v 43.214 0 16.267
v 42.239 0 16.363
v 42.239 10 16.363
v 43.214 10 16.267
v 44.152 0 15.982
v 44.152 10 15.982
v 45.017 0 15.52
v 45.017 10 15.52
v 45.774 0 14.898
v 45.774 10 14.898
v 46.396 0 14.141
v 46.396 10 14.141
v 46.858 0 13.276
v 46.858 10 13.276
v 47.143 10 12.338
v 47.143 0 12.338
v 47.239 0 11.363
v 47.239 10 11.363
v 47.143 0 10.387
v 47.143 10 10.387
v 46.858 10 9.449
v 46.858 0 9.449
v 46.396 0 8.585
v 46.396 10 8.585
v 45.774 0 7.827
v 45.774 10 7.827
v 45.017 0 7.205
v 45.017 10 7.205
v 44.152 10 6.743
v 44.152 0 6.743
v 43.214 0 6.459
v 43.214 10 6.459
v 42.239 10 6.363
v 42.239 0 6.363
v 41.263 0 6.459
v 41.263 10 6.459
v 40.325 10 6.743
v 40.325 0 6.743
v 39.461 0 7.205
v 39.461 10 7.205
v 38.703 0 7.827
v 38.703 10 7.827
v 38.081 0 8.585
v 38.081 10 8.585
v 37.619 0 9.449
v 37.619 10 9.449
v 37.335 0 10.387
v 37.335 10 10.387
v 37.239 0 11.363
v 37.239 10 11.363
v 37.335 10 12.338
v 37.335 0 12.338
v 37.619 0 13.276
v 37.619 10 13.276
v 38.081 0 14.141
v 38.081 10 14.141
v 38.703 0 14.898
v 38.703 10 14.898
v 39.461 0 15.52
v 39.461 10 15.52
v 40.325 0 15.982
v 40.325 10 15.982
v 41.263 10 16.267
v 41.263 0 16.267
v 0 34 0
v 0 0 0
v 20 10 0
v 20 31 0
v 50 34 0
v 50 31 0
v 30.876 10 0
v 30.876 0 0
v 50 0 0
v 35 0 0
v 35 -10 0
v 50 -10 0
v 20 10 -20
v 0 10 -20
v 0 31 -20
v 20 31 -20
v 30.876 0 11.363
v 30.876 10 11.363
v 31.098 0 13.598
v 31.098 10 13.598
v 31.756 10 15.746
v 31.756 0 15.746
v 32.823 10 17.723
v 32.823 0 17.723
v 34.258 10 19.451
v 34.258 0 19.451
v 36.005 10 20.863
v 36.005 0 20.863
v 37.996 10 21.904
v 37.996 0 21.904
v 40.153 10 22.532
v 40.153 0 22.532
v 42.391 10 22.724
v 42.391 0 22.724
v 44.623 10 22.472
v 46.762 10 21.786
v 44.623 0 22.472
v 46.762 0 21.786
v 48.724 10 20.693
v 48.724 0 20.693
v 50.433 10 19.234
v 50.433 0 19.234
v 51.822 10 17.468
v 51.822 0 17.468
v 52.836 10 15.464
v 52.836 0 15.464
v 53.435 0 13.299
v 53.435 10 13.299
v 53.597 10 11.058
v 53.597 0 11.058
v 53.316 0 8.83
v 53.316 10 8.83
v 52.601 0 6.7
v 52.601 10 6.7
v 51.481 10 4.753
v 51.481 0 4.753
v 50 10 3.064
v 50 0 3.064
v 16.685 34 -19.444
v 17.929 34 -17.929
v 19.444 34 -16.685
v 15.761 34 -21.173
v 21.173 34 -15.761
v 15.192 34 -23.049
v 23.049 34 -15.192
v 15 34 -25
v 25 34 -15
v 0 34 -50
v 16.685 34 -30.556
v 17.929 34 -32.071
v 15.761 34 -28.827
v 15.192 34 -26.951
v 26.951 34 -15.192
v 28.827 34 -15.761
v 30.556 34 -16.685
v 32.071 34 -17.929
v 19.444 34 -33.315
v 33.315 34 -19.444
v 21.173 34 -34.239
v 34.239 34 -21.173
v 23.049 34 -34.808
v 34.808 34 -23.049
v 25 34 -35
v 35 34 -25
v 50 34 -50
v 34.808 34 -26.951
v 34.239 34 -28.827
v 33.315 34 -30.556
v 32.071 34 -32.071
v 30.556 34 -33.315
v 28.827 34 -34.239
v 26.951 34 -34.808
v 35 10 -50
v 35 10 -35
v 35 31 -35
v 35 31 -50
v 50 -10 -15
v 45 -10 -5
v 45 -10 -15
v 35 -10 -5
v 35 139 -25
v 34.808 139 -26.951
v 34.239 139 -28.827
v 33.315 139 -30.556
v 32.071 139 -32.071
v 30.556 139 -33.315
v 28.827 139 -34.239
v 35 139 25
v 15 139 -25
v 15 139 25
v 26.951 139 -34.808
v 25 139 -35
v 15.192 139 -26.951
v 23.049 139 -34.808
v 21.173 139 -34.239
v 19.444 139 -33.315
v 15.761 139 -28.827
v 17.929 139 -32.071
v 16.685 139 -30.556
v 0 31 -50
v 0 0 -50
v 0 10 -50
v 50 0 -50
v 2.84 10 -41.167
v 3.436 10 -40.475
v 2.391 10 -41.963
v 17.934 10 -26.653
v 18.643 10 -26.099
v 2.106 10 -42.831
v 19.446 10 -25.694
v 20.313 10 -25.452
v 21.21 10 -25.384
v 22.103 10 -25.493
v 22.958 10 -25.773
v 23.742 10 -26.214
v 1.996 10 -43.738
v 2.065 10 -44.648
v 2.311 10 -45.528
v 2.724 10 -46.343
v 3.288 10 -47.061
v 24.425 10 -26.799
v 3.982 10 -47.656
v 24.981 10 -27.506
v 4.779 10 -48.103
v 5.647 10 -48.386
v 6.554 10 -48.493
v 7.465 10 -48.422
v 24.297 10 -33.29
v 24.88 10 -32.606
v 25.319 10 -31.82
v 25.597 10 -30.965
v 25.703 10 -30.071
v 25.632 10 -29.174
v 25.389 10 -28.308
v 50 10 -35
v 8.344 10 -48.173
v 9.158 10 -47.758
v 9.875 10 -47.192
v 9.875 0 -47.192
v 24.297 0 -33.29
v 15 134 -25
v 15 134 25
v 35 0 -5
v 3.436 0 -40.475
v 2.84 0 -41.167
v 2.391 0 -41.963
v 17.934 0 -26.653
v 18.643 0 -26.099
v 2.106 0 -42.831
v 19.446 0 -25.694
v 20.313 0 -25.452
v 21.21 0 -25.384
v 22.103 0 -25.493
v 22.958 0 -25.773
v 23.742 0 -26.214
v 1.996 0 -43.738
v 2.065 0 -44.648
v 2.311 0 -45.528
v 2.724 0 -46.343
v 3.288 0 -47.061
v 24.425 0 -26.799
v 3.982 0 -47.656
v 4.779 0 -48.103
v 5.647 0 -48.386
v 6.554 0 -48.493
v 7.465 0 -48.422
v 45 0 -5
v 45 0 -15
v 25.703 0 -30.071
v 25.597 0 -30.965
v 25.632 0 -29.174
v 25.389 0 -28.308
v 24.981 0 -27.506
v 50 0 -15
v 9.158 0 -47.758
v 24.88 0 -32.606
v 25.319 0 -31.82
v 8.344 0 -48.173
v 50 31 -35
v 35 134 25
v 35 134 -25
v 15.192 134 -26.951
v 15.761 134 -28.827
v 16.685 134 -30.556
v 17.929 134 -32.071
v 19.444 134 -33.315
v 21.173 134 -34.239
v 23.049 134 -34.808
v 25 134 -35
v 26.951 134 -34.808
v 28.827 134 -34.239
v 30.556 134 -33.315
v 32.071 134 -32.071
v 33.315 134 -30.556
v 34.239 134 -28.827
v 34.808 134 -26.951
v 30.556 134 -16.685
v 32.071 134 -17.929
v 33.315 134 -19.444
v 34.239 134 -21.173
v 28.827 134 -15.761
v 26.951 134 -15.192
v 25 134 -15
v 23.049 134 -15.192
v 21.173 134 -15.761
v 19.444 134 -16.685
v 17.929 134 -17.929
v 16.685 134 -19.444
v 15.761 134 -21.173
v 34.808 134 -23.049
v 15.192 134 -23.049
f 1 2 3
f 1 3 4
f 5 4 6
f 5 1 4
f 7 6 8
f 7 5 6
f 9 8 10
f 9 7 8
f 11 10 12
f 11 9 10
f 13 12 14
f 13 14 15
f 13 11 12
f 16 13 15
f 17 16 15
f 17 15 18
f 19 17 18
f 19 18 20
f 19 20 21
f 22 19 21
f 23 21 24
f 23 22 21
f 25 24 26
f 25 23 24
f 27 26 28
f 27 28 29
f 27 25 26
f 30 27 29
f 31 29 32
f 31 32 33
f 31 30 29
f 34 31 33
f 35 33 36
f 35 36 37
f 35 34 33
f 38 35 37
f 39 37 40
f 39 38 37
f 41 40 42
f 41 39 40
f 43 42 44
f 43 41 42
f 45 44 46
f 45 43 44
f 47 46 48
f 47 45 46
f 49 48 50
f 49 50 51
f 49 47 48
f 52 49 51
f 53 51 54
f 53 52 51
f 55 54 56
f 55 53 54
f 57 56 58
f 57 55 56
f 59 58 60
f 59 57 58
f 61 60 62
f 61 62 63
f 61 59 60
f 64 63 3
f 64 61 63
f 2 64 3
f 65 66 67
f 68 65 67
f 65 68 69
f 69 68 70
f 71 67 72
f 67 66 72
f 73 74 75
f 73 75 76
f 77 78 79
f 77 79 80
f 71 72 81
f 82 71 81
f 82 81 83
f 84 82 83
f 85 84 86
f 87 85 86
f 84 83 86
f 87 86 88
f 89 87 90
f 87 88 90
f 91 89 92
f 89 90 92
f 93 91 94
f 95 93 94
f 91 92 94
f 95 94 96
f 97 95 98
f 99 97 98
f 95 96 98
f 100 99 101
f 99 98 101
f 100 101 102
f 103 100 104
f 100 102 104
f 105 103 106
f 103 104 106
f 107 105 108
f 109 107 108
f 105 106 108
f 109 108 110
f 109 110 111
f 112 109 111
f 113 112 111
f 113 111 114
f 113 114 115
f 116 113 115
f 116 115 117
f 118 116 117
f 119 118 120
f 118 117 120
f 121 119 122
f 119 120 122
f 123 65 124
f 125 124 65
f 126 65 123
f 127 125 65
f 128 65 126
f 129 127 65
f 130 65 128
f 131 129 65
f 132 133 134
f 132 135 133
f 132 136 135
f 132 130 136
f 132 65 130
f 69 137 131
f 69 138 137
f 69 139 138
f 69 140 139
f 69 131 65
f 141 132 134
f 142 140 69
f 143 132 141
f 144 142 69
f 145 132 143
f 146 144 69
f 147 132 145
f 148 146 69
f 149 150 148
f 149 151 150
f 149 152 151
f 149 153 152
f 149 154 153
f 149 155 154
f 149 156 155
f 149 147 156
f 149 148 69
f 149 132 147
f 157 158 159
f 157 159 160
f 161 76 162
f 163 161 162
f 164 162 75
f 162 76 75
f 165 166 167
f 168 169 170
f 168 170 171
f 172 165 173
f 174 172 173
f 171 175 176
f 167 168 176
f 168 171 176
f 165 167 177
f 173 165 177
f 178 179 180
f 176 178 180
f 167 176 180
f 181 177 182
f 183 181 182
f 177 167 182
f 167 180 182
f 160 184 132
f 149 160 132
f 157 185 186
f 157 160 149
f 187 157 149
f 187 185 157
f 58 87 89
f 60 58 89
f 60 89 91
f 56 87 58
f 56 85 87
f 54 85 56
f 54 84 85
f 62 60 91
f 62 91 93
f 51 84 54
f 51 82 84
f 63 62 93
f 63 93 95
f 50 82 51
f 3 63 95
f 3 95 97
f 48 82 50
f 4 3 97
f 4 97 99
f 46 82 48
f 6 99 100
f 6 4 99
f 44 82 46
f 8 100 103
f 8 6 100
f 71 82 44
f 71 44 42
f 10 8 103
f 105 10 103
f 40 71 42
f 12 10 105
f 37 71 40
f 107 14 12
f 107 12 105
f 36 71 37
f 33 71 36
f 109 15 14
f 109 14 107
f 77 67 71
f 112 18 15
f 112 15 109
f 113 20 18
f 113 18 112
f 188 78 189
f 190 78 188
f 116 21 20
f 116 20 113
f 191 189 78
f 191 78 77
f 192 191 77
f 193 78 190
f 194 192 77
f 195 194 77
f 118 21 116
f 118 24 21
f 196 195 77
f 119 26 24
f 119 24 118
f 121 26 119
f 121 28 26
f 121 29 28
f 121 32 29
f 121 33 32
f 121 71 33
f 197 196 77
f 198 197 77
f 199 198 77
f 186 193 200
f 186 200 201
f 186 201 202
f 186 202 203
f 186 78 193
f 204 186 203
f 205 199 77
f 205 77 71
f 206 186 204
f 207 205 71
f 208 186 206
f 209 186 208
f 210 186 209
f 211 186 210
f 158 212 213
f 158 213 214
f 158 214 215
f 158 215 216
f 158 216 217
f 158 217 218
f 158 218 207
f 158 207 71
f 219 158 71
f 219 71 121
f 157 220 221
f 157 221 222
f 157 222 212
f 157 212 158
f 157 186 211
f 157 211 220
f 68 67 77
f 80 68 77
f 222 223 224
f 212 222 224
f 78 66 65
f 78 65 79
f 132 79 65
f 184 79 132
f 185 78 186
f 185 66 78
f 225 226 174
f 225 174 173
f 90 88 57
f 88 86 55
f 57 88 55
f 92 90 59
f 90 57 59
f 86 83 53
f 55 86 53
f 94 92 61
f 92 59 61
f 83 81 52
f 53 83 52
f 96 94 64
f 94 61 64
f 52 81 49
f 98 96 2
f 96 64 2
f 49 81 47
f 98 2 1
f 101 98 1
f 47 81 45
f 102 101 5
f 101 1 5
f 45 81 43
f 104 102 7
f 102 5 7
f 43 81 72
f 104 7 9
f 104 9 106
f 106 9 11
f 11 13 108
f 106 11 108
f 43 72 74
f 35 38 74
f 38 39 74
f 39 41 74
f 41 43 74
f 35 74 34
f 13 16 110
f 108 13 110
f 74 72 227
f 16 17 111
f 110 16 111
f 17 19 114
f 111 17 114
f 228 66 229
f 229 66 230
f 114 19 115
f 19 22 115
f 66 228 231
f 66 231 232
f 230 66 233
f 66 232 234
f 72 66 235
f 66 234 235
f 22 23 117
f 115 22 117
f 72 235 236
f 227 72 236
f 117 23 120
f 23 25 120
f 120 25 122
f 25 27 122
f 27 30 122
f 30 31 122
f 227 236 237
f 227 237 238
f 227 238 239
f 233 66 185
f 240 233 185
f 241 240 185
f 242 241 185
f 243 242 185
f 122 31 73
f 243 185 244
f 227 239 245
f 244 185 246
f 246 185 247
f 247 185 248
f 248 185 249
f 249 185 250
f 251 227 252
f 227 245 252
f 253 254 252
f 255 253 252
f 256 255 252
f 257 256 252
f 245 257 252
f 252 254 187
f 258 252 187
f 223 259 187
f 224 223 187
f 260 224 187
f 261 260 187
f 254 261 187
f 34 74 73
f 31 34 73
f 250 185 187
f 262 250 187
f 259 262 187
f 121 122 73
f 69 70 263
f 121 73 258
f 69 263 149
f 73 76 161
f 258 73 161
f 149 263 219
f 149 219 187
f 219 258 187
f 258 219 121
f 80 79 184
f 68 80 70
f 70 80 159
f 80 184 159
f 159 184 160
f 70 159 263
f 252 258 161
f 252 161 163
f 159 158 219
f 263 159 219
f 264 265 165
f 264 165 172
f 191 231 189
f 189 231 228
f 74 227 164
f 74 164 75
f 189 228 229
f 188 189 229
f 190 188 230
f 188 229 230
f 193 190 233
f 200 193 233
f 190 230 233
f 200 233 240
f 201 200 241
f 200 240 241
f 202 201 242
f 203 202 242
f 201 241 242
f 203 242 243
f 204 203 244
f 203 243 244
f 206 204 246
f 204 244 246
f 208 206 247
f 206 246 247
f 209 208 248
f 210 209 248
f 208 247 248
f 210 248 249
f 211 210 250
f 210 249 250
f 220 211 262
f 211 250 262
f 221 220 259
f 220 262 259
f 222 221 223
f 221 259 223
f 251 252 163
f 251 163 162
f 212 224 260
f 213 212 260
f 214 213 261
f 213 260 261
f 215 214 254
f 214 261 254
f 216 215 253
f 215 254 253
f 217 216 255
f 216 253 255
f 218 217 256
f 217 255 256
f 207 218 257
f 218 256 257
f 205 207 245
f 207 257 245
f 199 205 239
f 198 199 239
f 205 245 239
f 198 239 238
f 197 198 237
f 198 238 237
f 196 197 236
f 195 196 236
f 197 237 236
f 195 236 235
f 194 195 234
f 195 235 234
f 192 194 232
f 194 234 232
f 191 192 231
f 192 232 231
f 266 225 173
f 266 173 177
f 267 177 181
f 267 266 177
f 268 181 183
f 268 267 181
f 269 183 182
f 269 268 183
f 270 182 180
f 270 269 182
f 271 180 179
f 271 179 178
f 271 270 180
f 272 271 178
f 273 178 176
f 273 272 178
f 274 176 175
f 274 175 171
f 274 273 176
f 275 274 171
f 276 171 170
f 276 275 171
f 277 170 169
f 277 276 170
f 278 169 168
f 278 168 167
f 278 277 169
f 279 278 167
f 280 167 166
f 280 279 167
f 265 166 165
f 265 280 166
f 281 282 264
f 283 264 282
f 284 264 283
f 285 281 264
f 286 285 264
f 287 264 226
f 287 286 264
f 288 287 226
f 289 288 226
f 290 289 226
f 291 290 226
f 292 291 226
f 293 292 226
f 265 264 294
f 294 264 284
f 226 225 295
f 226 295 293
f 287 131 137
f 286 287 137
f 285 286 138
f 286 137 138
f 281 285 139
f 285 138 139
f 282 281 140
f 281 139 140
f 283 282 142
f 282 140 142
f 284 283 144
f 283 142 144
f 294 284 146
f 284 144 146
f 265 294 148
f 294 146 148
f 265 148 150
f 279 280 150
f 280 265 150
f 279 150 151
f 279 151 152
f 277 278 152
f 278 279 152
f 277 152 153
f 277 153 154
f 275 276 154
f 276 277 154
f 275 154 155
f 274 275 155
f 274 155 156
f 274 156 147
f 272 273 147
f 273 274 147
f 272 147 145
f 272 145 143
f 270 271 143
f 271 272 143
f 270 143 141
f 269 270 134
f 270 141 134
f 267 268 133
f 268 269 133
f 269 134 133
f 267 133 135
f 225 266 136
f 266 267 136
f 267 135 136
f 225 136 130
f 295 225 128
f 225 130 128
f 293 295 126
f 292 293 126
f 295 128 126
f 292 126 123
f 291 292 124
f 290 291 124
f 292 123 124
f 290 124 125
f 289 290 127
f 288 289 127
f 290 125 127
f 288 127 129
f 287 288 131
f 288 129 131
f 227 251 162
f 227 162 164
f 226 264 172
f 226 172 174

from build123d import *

# Parameters (mm, degrees)
SKETCH1_R           = 5
BOSS_EXTRUDE1_DEPTH = 10
BOSS_EXTRUDE2_DEPTH = 10
SKETCH3_W           = 20
SKETCH3_H           = 20
SKETCH3_W_2         = 15
SKETCH3_H_2         = 15
BOSS_EXTRUDE3_DEPTH = 21
SKETCH4_W           = 50
SKETCH4_H           = 50
BOSS_EXTRUDE4_DEPTH = 3
SKETCH5_R           = 10
BOSS_EXTRUDE5_DEPTH = 100
BOSS_EXTRUDE6_DEPTH = 5


with BuildPart() as part:
    # Sketch1 → Boss-Extrude1 (new body)
    with BuildSketch(Plane(origin=(0, 0, 0), x_dir=(1, 0, 0), z_dir=(0, 1, 0))):
        with BuildLine():
            Line((0, 0), (30.876052193, 0))
            Line((30.876052193, 0), (30.876052193, -11.362717468))
            ThreePointArc((30.876052193, -11.362717468), (46.762190972, -21.786248919), (50, -3.063642105))
            Line((50, -3.063642105), (50, 0))
            Line((50, 0), (50, 50))
            Line((50, 50), (0, 50))
            Line((0, 50), (0, 0))
        make_face()
        with Locations(Location((42.238769661, -11.362717468, 0), (0, 0, 270))):
            Circle(SKETCH1_R, mode=Mode.SUBTRACT)
        with BuildLine():
            Line((9.874654059, 47.191553979), (24.296746366, 33.290272916))
            ThreePointArc((24.296746366, 33.290272916), (24.424993645, 26.799159409), (17.934255558, 26.653142217))
            Line((17.934255558, 26.653142217), (3.436266044, 40.475249935))
            ThreePointArc((3.436266044, 40.475249935), (3.288101967, 47.061421086), (9.874654059, 47.191553979))
        make_face(mode=Mode.SUBTRACT)
    extrude(amount=BOSS_EXTRUDE1_DEPTH)

    # Sketch2 → Boss-Extrude2 (add)
    with BuildSketch(Plane.XZ):
        Polygon((45, -5), (35, -5), (35, 0), (50, 0), (50, -15), (45, -15), align=None)
    extrude(amount=BOSS_EXTRUDE2_DEPTH)

    # Sketch3 → Boss-Extrude3 (add)
    with BuildSketch(Plane(origin=(0, 10, 0), x_dir=(1, 0, 0), z_dir=(0, 1, 0))):
        with Locations((10, 10)):
            Rectangle(SKETCH3_W, SKETCH3_H)
        with Locations((42.5, 42.5)):
            Rectangle(SKETCH3_W_2, SKETCH3_H_2)
    extrude(amount=BOSS_EXTRUDE3_DEPTH)

    # Sketch4 → Boss-Extrude4 (add)
    with BuildSketch(Plane(origin=(0, 31, 0), x_dir=(1, 0, 0), z_dir=(0, 1, 0))):
        with Locations((25, 25)):
            Rectangle(SKETCH4_W, SKETCH4_H)
    extrude(amount=BOSS_EXTRUDE4_DEPTH)

    # Sketch5 → Boss-Extrude5 (add)
    with BuildSketch(Plane(origin=(0, 34, 0), x_dir=(1, 0, 0), z_dir=(0, 1, 0))):
        with Locations(Location((25, 25, 0), (0, 0, 270))):
            Circle(SKETCH5_R)
    extrude(amount=BOSS_EXTRUDE5_DEPTH)

    # Sketch6 → Boss-Extrude6 (add)
    with BuildSketch(Plane(origin=(0, 134, 0), x_dir=(1, 0, 0), z_dir=(0, 1, 0))):
        with BuildLine():
            Line((35, 25), (35, -25))
            Line((35, -25), (15, -25))
            Line((15, -25), (15, 25))
            ThreePointArc((15, 25), (25, 35), (35, 25))
        make_face()
    extrude(amount=BOSS_EXTRUDE6_DEPTH)


solid = part.part
